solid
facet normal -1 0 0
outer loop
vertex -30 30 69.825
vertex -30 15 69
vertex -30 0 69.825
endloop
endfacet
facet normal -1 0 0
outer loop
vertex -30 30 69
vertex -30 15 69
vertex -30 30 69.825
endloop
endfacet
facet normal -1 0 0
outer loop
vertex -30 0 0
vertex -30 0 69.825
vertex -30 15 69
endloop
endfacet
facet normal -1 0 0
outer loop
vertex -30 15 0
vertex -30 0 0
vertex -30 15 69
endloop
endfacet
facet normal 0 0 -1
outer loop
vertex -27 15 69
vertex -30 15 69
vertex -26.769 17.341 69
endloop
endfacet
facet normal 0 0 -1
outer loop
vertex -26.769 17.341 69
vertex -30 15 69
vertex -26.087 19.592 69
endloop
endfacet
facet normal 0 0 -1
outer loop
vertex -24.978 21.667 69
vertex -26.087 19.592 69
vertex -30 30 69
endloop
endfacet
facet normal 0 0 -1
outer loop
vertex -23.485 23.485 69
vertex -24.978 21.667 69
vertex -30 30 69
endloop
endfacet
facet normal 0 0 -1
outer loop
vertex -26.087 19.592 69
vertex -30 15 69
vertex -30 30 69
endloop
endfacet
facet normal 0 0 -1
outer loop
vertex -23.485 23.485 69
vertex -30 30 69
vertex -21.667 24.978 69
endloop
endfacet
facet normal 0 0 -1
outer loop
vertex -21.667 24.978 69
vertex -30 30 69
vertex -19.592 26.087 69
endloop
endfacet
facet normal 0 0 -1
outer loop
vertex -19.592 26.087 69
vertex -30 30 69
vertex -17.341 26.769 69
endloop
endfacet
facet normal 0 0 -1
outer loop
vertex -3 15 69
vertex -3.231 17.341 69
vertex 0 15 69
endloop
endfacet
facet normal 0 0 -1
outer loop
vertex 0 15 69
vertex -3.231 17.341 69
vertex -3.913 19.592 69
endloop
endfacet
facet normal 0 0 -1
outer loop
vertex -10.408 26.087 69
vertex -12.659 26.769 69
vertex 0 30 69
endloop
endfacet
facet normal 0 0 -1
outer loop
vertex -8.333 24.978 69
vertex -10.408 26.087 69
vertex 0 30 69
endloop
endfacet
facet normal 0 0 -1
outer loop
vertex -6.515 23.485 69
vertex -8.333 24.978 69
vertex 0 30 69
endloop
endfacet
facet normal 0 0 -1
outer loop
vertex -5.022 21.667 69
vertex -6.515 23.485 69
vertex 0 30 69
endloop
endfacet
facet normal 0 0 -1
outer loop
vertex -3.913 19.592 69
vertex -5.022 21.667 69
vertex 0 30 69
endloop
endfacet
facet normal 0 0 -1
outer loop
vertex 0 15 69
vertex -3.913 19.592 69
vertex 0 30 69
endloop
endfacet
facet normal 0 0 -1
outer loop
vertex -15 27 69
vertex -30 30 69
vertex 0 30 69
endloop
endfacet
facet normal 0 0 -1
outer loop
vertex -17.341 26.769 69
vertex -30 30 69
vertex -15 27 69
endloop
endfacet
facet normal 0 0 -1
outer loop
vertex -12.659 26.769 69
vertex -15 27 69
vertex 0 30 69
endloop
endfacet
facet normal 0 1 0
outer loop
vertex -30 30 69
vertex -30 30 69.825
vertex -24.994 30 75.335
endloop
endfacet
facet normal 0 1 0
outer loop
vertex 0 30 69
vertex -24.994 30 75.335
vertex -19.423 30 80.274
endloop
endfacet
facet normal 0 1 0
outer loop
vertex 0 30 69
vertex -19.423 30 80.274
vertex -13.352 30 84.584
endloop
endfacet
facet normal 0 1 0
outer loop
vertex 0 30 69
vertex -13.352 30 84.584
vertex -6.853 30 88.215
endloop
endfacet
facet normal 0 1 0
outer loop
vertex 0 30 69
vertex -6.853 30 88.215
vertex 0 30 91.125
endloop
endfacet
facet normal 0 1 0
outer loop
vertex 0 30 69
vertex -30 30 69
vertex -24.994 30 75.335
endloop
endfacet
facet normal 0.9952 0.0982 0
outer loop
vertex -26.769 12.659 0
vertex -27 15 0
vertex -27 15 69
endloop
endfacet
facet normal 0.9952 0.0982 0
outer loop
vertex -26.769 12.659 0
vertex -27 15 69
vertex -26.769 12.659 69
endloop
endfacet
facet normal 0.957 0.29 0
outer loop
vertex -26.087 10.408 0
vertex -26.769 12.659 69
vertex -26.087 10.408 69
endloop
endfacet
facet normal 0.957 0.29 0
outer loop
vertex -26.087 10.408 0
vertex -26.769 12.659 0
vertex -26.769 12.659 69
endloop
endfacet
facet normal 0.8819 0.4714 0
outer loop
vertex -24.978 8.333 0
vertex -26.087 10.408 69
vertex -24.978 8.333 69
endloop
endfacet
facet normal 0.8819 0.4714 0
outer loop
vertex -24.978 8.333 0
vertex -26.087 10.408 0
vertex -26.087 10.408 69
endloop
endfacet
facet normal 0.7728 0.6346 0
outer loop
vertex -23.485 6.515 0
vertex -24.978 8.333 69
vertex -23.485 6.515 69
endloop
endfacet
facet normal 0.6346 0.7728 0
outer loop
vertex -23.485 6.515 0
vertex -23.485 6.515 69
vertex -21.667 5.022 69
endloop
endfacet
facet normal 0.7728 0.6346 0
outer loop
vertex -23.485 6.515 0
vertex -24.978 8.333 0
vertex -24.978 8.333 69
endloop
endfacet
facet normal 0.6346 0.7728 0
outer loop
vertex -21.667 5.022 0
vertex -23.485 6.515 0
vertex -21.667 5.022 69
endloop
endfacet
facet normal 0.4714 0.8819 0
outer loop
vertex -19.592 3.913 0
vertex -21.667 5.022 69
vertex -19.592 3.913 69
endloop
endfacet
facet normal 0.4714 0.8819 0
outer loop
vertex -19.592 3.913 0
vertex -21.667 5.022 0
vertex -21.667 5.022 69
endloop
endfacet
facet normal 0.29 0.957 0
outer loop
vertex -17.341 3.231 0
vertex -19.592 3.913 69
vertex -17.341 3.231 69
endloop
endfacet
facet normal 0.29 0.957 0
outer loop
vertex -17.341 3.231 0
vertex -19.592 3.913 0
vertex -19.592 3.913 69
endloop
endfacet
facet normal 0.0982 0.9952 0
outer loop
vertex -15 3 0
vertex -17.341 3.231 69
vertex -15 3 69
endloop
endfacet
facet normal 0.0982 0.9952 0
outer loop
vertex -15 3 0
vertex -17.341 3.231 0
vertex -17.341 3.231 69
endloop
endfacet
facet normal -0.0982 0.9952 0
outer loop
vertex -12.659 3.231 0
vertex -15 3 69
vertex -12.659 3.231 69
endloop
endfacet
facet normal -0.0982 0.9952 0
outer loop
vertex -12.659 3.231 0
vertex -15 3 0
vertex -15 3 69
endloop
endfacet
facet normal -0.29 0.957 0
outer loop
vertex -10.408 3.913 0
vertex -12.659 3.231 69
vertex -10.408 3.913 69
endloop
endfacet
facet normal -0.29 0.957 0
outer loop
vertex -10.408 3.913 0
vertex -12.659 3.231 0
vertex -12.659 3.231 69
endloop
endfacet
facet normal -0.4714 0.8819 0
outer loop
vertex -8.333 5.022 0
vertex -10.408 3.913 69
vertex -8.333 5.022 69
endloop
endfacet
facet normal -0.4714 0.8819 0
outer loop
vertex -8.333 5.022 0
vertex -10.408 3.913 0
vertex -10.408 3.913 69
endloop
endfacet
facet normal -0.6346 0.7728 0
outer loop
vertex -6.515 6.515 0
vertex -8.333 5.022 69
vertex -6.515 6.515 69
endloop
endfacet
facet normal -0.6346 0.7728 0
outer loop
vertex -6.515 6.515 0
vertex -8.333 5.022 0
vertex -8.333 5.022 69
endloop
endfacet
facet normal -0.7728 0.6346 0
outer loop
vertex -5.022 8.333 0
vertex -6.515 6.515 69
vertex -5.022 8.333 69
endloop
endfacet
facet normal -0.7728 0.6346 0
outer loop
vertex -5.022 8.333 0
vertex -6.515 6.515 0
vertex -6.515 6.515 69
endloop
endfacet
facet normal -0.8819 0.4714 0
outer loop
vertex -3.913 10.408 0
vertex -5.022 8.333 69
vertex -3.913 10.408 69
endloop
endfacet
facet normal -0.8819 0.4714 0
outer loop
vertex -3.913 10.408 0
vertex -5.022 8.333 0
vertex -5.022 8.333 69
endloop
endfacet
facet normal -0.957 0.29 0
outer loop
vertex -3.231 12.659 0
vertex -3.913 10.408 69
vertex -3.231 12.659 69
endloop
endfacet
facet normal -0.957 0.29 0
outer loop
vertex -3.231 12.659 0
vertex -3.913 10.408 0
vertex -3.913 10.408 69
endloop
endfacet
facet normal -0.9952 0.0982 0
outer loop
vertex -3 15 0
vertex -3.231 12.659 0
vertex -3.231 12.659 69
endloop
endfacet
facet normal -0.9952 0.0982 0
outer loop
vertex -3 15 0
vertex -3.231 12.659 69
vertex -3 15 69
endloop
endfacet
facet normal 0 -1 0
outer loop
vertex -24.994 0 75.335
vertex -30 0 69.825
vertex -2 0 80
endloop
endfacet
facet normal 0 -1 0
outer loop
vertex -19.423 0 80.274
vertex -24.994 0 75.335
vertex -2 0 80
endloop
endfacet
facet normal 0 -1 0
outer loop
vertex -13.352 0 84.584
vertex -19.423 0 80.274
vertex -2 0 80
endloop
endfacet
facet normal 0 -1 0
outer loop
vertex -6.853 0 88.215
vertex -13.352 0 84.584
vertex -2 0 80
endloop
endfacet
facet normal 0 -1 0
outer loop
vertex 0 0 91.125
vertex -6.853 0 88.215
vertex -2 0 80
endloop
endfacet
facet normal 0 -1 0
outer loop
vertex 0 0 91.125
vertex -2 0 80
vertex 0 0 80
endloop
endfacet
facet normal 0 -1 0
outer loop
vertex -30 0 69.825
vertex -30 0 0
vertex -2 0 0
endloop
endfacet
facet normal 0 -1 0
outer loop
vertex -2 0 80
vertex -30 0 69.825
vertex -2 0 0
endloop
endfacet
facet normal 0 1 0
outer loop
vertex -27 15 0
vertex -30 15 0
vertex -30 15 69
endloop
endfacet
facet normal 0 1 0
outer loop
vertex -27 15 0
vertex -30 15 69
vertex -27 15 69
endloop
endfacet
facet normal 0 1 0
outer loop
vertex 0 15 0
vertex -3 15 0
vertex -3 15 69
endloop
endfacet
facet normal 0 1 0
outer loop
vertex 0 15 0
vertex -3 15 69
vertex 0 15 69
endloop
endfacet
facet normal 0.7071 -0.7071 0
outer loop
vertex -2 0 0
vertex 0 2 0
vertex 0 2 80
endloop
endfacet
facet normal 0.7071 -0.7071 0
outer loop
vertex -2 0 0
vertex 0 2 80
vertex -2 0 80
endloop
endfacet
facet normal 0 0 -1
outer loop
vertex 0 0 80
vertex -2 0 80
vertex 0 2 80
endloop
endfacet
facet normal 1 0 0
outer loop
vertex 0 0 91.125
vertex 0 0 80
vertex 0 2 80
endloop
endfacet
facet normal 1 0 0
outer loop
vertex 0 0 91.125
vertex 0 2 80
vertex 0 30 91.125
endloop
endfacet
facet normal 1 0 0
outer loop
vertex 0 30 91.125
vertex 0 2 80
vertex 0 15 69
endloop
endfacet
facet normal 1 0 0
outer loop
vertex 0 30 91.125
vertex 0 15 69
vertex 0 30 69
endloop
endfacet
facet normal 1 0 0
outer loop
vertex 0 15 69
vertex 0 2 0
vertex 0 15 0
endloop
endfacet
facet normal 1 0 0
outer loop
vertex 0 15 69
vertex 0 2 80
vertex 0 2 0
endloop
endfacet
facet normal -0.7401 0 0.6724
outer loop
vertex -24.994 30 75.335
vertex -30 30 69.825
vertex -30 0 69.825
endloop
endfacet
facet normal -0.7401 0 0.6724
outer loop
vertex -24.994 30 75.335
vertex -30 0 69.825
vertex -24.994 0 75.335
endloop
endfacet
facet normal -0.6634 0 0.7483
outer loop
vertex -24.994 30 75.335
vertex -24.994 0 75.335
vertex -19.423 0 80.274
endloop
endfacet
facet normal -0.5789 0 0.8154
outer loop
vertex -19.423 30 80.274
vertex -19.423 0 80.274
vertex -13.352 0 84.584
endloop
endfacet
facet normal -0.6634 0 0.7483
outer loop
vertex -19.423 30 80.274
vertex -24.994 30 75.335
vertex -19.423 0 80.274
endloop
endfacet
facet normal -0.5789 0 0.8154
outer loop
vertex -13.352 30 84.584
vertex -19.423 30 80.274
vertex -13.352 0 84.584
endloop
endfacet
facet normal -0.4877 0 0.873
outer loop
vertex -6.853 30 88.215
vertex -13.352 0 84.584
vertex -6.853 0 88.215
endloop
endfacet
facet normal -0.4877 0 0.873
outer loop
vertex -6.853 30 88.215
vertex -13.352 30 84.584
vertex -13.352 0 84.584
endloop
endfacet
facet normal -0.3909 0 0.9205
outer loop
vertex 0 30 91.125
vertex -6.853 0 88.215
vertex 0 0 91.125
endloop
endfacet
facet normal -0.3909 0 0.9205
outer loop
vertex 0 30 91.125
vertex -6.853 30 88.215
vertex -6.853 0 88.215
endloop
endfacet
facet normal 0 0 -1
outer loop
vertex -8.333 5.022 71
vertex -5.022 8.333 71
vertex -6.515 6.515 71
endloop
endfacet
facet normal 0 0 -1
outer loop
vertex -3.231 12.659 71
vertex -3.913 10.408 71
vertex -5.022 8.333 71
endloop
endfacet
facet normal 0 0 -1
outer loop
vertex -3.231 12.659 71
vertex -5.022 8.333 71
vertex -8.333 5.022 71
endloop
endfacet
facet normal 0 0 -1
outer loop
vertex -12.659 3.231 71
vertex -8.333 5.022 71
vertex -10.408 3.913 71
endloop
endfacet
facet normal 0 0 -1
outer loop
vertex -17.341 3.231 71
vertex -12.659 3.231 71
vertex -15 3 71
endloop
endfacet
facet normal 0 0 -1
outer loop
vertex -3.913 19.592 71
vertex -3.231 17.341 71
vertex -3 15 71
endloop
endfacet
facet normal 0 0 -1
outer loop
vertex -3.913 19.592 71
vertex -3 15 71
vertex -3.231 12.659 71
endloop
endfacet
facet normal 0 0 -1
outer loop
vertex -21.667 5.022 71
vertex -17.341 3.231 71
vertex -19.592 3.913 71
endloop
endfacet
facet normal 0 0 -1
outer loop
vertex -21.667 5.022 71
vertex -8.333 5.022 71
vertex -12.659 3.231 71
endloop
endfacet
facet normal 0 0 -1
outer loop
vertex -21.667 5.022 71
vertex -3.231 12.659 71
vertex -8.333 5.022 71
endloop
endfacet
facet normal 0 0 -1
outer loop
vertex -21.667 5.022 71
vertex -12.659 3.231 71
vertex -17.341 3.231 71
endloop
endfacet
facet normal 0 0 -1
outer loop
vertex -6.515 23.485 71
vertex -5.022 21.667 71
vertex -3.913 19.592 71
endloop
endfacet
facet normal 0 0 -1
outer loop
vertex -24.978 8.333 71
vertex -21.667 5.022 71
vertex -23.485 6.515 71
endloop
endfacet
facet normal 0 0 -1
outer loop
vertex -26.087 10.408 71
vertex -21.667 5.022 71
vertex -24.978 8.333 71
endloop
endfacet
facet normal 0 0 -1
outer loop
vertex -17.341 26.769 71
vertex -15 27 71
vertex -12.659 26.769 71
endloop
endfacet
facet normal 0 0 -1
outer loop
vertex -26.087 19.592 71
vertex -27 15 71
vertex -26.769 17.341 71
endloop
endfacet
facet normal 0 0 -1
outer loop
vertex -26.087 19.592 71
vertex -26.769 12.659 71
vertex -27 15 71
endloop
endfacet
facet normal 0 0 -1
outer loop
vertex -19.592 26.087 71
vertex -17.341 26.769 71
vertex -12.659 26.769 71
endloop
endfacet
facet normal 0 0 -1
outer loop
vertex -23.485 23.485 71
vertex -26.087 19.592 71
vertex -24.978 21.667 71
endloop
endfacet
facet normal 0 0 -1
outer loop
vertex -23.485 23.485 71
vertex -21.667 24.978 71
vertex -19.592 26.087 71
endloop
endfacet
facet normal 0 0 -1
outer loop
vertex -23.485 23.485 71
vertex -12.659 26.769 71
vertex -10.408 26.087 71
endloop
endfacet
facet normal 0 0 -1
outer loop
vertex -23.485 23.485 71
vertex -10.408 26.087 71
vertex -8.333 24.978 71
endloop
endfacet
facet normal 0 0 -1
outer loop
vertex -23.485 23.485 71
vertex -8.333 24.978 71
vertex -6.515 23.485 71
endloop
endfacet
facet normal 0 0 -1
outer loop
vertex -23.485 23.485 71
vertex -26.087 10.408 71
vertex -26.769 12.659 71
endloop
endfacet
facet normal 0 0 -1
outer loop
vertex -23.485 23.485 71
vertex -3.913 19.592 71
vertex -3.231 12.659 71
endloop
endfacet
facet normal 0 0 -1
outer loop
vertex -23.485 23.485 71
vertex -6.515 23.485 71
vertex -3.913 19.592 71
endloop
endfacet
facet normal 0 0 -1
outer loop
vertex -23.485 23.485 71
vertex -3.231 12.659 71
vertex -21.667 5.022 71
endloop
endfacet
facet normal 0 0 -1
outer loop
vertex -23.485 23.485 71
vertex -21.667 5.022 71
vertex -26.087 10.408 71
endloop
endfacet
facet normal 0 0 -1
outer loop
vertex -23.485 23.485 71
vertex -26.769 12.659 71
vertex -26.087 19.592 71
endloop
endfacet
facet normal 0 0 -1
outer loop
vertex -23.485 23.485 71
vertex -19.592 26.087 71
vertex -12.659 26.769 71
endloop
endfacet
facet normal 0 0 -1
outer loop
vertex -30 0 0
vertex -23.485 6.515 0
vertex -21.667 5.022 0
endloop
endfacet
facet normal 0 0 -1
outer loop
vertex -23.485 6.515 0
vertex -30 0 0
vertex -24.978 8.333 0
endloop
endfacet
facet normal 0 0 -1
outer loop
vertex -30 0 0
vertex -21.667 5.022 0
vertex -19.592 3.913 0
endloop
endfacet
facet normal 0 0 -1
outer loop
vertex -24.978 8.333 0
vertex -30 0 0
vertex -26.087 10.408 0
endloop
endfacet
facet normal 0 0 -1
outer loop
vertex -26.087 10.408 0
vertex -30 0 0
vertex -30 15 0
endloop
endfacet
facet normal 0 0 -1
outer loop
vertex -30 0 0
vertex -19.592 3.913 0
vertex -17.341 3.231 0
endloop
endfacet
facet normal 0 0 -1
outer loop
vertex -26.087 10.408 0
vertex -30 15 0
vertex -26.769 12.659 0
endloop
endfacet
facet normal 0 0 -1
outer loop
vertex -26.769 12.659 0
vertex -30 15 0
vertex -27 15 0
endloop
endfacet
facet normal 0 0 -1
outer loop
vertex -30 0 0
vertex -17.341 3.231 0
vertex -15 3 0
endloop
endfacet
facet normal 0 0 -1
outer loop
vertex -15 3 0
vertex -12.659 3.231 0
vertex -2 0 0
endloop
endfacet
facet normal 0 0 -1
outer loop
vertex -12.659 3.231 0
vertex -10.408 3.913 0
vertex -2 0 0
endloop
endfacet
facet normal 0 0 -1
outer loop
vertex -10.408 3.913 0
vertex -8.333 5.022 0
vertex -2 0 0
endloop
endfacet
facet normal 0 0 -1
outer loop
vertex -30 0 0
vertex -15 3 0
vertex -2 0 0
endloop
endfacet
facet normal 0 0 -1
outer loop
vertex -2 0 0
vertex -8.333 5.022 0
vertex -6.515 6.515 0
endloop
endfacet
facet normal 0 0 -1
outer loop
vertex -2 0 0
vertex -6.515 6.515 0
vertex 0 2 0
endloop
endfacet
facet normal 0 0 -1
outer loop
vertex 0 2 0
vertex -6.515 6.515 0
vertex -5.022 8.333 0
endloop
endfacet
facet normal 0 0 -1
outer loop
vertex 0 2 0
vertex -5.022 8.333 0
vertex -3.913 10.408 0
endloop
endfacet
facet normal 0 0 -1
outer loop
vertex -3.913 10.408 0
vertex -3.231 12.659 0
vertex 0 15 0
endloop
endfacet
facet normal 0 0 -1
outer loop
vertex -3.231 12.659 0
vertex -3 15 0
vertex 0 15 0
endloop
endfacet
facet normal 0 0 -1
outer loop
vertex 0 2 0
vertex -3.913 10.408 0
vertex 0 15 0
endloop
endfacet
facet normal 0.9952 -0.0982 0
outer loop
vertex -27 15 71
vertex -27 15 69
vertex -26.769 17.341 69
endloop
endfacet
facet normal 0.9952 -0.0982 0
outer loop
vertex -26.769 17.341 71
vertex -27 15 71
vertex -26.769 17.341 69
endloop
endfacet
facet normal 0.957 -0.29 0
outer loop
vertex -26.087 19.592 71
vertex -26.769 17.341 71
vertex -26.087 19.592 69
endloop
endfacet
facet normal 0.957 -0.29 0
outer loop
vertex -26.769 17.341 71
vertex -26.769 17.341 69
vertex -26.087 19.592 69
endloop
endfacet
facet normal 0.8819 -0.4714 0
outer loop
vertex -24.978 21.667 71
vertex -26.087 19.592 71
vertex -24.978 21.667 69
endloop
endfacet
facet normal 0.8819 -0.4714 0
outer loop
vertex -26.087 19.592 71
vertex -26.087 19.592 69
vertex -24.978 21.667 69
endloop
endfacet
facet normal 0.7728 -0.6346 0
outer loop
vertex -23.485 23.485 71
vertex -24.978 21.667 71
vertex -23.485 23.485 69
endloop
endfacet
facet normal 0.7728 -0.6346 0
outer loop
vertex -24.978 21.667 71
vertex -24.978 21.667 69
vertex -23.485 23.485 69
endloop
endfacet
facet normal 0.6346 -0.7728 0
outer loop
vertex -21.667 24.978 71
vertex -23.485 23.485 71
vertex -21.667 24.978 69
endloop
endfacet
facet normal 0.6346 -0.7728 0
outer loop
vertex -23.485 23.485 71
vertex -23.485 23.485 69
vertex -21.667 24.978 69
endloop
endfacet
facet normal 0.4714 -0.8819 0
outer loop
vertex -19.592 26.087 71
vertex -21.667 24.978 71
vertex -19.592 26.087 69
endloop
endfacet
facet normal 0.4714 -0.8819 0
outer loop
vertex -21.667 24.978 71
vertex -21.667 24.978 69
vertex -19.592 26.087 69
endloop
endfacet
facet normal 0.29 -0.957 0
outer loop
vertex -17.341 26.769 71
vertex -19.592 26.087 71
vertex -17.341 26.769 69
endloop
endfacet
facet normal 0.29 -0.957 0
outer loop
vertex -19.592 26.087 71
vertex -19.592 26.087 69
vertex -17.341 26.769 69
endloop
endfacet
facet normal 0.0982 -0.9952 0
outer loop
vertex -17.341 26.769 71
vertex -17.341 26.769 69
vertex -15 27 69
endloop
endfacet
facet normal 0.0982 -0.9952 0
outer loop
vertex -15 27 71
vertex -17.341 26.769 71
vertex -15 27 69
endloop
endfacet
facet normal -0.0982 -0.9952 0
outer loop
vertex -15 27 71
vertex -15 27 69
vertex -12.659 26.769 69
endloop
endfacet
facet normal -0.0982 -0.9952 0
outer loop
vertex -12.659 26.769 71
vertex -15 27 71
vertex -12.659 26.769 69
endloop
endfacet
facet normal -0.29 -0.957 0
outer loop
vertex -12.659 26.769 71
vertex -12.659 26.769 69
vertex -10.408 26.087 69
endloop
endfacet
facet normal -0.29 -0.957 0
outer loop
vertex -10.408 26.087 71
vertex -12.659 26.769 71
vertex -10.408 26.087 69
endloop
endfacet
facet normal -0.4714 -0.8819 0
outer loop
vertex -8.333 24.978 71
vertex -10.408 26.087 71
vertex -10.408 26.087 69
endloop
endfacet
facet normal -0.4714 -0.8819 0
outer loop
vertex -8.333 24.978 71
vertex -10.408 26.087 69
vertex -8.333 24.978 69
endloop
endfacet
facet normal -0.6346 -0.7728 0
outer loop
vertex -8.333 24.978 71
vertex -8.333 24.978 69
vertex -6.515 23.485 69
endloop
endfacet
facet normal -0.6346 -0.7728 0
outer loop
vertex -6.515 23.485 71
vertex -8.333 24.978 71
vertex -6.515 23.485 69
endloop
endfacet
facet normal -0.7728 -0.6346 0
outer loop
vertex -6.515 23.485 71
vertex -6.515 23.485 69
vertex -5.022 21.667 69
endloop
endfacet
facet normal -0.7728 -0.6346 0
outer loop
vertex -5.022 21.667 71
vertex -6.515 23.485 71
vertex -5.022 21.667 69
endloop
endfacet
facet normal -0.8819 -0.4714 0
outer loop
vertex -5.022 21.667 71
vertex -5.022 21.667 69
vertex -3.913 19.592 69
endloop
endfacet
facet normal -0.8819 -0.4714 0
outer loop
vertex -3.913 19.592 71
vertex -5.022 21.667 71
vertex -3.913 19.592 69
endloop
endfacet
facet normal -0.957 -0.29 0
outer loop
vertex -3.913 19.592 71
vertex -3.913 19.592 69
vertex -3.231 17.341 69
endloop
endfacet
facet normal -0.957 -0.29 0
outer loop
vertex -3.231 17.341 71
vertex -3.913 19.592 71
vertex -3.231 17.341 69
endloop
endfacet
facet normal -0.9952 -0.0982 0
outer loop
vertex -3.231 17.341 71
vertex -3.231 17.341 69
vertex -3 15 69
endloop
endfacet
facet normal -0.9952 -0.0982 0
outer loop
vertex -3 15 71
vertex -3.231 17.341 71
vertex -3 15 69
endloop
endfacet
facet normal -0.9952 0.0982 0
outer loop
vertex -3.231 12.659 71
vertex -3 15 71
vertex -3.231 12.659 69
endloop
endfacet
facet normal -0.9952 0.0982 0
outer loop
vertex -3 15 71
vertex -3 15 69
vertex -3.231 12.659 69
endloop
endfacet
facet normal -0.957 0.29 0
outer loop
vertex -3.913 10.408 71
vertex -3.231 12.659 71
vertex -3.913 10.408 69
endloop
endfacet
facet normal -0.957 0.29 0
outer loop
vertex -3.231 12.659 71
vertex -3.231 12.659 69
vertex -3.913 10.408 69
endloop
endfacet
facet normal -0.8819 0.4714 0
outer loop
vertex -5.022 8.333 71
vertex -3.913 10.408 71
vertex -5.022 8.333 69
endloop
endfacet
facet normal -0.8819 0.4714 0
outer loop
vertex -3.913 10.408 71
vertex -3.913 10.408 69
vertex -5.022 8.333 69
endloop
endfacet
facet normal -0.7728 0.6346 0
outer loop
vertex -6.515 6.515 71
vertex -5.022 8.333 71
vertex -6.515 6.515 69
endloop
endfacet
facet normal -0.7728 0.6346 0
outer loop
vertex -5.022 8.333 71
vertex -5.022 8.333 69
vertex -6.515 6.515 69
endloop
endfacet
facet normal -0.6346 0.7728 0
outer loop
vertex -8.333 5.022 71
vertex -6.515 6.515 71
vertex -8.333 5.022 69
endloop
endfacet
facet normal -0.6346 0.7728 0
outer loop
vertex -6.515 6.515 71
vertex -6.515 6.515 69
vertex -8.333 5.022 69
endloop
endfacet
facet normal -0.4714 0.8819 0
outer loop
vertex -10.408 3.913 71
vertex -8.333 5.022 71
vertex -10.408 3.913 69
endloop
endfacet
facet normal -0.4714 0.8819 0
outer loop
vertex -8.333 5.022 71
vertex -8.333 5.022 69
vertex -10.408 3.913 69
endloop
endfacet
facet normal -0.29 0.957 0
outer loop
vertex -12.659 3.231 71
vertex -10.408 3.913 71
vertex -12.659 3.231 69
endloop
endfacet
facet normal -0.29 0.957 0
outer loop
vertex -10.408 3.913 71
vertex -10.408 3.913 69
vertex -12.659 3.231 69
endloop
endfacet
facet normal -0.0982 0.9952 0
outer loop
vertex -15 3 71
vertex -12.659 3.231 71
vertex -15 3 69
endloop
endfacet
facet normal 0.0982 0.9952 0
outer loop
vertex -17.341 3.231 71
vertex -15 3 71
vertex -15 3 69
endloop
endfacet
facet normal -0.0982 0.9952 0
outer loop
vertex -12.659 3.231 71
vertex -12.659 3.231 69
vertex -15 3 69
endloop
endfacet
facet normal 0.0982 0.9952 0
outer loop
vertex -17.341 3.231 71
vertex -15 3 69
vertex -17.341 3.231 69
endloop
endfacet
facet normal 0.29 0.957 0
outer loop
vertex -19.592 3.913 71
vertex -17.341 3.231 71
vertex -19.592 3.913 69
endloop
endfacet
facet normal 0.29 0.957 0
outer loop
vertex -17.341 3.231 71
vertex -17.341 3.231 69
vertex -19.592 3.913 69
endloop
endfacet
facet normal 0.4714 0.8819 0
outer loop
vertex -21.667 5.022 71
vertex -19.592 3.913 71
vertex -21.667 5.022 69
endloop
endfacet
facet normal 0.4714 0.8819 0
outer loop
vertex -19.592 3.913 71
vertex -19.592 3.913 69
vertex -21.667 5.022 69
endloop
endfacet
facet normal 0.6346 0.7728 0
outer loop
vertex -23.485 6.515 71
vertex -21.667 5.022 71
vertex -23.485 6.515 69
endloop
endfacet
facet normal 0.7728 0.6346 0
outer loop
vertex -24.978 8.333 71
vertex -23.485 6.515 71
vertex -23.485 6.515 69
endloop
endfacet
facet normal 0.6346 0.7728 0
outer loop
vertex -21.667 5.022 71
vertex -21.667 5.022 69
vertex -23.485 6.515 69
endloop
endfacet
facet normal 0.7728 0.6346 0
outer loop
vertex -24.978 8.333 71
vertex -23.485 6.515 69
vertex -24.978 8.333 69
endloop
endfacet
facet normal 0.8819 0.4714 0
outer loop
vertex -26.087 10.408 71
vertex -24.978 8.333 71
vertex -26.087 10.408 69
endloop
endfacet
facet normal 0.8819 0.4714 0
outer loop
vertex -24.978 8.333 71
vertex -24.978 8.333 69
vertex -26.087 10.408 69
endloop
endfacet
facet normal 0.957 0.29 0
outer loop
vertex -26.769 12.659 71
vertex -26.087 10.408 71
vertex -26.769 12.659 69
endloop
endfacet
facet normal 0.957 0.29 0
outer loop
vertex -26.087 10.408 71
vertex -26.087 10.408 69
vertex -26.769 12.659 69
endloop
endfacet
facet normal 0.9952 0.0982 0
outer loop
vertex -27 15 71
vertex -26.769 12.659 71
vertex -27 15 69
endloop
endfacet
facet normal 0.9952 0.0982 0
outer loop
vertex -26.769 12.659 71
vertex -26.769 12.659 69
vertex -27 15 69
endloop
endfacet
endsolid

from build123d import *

# Parameters (mm, degrees)
SKETCH2_W           = 30
SKETCH2_H           = 30
BOSS_EXTRUDE1_DEPTH = 100
CUT_EXTRUDE1_START  = -30
CUT_EXTRUDE1_DEPTH  = 30
CUT_EXTRUDE2_DEPTH  = 69
CUT_EXTRUDE3_DEPTH  = 80
SKETCH6_R           = 12
CUT_EXTRUDE4_DEPTH  = 2


# Read off the part's stored shape, not the designer's step: Cut-Extrude1
with BuildPart() as part:
    # Sketch2 → Boss-Extrude1 (new body)
    with BuildSketch(Plane.XY):
        with Locations((-15, 15)):
            Rectangle(SKETCH2_W, SKETCH2_H)
    extrude(amount=BOSS_EXTRUDE1_DEPTH)

    # Cut-Extrude1 outline → Cut-Extrude1 (cut)
    with BuildSketch(Plane.XZ.offset(CUT_EXTRUDE1_START)):
        with BuildLine():
            ThreePointArc((-30, 69.824648593), (-16.445900415, 82.511221459), (0, 91.124879576))
            Line((0, 91.124879576), (0, 100))
            Line((0, 100), (-30, 100))
            Line((-30, 100), (-30, 69.824648593))
        make_face()
    extrude(amount=CUT_EXTRUDE1_DEPTH, mode=Mode.SUBTRACT)

    # Sketch4 → Cut-Extrude2 (cut)
    with BuildSketch(Plane(origin=(0, 0, 0), x_dir=(-1, 0, 0), z_dir=(0, 0, -1))):
        with BuildLine():
            Line((3, 15), (0, 15))
            Line((0, 15), (0, 30))
            Line((0, 30), (30, 30))
            Line((30, 30), (30, 15))
            Line((30, 15), (27, 15))
            ThreePointArc((27, 15), (15, 3), (3, 15))
        make_face()
    extrude(amount=-CUT_EXTRUDE2_DEPTH, mode=Mode.SUBTRACT)

    # Sketch5 → Cut-Extrude3 (cut)
    with BuildSketch(Plane(origin=(0, 0, 0), x_dir=(-1, 0, 0), z_dir=(0, 0, -1))):
        Polygon((0, 0), (0, 2), (2, 0), align=None)
    extrude(amount=-CUT_EXTRUDE3_DEPTH, mode=Mode.SUBTRACT)

    # Sketch6 → Cut-Extrude4 (cut)
    with BuildSketch(Plane(origin=(0, 0, 69), x_dir=(-1, 0, 0), z_dir=(0, 0, -1))):
        with Locations((15, 15)):
            Circle(SKETCH6_R)
    extrude(amount=-CUT_EXTRUDE4_DEPTH, mode=Mode.SUBTRACT)


solid = part.part
